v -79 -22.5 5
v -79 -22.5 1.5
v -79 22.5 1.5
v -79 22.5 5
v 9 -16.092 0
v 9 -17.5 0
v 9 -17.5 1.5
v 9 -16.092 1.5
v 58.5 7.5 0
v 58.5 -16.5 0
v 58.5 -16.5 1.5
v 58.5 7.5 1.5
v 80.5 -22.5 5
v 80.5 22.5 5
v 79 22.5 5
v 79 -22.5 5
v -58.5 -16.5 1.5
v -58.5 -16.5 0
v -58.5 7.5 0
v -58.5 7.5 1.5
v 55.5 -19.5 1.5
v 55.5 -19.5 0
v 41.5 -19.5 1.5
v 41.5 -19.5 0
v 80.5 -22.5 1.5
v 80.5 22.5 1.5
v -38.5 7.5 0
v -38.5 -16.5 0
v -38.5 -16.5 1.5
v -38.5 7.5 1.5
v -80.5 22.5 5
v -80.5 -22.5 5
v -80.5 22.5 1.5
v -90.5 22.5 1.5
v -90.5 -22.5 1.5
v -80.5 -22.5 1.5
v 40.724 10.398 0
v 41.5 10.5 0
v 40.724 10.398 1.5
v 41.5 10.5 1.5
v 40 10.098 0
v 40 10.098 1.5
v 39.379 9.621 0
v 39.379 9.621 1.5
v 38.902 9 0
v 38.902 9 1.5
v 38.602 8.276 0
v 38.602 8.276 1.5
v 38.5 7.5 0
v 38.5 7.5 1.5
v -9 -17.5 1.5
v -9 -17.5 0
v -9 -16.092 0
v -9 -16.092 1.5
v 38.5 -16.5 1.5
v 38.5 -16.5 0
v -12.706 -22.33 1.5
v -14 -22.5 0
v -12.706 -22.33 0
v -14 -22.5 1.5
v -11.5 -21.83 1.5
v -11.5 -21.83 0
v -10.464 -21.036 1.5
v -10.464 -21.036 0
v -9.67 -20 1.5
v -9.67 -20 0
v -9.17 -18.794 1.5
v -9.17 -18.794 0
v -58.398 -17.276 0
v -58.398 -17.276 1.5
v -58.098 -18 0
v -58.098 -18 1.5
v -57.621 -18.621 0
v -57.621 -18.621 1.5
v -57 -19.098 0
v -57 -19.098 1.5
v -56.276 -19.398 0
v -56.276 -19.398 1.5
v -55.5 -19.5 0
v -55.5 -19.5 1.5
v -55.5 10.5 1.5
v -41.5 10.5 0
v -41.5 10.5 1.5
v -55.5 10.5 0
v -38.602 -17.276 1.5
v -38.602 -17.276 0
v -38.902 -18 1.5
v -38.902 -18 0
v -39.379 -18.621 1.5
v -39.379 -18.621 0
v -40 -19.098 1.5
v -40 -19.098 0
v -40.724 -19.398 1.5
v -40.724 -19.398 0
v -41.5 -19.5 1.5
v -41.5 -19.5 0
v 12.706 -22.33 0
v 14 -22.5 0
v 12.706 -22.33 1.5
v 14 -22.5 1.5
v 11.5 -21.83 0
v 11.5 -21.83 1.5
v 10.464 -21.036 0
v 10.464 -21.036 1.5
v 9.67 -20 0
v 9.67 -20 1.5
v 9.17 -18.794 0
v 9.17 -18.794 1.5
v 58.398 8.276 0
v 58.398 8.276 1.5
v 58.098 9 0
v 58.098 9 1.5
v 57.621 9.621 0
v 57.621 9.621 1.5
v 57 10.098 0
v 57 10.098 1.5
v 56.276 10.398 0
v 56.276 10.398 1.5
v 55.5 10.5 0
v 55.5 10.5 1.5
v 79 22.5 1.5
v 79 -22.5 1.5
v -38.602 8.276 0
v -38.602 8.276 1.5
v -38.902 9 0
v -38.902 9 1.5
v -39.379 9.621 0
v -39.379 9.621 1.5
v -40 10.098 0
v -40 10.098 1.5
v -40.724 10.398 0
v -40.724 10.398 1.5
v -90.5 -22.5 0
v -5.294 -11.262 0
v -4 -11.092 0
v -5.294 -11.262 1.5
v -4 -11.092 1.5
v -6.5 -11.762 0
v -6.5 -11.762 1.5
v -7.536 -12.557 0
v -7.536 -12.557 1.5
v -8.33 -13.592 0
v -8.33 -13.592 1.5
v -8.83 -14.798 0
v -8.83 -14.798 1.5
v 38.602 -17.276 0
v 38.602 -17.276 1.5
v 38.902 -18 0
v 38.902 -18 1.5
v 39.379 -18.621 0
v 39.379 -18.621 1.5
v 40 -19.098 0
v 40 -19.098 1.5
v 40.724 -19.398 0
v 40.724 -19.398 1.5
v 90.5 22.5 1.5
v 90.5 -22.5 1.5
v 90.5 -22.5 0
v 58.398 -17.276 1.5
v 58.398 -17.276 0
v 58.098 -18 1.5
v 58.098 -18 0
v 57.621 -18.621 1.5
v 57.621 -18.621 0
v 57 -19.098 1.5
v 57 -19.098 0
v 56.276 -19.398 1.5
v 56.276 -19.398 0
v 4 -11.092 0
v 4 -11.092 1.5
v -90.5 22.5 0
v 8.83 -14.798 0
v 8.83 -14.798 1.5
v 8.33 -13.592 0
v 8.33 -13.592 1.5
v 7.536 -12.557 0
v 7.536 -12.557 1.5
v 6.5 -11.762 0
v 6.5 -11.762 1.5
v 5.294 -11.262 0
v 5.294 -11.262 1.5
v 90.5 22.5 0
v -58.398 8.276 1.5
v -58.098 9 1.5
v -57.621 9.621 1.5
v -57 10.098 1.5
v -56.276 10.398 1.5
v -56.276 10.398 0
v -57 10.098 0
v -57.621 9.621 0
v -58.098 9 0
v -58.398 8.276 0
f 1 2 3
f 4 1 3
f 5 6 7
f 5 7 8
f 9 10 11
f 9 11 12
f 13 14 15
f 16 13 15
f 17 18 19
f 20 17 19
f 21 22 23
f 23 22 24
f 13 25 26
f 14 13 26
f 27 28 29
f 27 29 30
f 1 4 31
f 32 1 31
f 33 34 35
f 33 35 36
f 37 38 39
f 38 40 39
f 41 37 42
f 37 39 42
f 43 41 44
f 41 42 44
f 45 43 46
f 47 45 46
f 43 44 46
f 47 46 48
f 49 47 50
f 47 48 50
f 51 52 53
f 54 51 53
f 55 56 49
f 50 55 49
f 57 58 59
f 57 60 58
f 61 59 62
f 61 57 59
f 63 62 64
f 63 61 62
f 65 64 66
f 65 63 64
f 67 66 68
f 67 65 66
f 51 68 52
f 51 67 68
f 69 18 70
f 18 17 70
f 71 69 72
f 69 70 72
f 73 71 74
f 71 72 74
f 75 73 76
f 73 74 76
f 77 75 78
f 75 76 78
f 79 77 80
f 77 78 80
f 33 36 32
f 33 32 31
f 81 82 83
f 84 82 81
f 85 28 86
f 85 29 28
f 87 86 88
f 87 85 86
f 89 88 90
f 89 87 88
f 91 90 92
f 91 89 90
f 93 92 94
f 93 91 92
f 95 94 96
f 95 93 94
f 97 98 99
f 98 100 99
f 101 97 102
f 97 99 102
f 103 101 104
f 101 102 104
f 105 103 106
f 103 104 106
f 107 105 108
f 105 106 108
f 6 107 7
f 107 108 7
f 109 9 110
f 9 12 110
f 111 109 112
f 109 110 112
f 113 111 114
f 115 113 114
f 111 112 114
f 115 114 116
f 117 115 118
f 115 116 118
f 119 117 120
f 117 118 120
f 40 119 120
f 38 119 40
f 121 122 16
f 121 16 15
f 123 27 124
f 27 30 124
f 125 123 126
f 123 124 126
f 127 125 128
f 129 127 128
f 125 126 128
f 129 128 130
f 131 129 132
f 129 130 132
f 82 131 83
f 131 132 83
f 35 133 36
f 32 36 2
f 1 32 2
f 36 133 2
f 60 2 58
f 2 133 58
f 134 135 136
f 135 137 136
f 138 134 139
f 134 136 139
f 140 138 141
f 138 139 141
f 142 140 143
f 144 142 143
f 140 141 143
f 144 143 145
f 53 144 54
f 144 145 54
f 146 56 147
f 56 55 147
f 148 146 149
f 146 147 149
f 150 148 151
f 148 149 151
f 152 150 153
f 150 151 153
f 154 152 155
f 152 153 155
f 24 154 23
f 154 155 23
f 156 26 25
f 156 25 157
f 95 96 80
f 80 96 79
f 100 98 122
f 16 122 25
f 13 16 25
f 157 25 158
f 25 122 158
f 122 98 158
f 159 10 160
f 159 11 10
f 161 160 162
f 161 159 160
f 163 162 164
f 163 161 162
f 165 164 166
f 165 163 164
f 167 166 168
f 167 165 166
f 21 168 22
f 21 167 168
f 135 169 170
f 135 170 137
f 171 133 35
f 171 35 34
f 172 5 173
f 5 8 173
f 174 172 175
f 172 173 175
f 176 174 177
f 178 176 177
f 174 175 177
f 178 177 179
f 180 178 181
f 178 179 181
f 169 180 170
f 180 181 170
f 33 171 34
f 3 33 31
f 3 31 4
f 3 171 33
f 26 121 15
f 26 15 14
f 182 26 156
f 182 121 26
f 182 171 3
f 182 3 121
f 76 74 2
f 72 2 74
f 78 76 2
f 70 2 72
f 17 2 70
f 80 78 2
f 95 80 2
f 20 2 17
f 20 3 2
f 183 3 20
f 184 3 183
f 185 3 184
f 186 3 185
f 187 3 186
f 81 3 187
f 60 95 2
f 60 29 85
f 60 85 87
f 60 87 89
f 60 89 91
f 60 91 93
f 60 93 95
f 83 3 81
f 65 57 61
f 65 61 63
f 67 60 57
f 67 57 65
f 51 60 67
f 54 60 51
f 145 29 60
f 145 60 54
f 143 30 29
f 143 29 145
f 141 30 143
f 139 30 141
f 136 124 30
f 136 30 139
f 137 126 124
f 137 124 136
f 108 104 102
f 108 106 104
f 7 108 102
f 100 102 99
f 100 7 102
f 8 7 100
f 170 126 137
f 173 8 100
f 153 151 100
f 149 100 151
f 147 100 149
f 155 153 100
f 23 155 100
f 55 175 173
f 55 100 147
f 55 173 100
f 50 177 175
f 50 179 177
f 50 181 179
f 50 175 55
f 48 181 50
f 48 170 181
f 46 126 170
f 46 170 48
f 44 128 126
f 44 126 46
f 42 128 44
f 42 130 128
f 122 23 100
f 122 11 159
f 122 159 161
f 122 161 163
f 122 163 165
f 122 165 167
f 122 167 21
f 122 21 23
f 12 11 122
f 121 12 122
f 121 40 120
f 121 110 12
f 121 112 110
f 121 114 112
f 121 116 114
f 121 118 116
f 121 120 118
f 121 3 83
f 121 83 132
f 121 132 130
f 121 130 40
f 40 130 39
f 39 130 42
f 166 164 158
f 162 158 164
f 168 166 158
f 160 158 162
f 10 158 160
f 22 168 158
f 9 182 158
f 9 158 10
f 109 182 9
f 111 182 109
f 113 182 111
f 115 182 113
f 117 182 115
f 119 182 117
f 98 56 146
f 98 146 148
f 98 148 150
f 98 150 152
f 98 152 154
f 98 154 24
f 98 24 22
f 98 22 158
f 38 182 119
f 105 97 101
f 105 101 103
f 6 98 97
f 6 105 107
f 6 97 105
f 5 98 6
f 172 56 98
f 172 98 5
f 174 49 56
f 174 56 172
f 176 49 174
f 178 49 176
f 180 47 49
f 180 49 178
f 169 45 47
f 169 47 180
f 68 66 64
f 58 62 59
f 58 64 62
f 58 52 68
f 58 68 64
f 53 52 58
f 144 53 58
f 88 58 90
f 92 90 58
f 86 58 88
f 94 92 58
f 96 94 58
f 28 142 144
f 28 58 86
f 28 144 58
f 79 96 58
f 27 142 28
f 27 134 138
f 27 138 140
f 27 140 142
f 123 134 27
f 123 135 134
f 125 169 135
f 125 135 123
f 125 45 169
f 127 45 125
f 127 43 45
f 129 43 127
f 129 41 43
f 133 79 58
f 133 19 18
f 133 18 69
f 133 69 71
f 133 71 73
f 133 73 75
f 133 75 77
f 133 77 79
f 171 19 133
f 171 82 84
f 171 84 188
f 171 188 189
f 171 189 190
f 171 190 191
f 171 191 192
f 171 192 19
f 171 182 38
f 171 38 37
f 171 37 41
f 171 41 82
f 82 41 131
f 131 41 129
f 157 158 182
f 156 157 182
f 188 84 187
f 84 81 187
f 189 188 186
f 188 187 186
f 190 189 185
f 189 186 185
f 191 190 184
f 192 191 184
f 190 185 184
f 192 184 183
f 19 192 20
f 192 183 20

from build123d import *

# Parameters (mm, degrees)
SKETCH_1_W          = 181
SKETCH_1_H          = 45
EXTRUDE_1_DEPTH     = 1.5
SKETCH_2_W          = 18
SKETCH_2_H          = 15
SKETCH_2_W_2        = 20
SKETCH_2_H_2        = 30
CUT_EXTRUDE_2_DEPTH = 94.267089587
FILLET_1_R          = 5
FILLET_2_R          = 5
FILLET_3_R          = 3
SKETCH_3_W          = 1.5
SKETCH_3_H          = 45
EXTRUDE_2_DEPTH     = 5


with BuildPart() as part:
    # 草图1 → 凸台-拉伸1 (new body)
    with BuildSketch(Plane.XY):
        Rectangle(SKETCH_1_W, SKETCH_1_H)
    extrude(amount=EXTRUDE_1_DEPTH)

    # 草图2 → 切除-拉伸2 (cut, through all)
    with BuildSketch(Plane(origin=(0, 0, 0), x_dir=(-1, 0, 0), z_dir=(0, 0, -1))):
        with Locations((0, -18.592127564)):
            Rectangle(SKETCH_2_W, SKETCH_2_H)
        with Locations((48.5, -4.5)):
            Rectangle(SKETCH_2_W_2, SKETCH_2_H_2)
        with Locations((-48.5, -4.5)):
            Rectangle(SKETCH_2_W_2, SKETCH_2_H_2)
    extrude(amount=-CUT_EXTRUDE_2_DEPTH, mode=Mode.SUBTRACT)

    # 圆角1
    fillet_1_edges = [part.edges().sort_by_distance(p)[0] for p in [
        (-9, -22.5, 0.75),
        (9, -22.5, 0.75),
    ]]
    fillet(fillet_1_edges, radius=FILLET_1_R)

    # 圆角2
    fillet_2_edges = [part.edges().sort_by_distance(p)[0] for p in [
        (-9, -11.092127564, 0.75),
        (9, -11.092127564, 0.75),
    ]]
    fillet(fillet_2_edges, radius=FILLET_2_R)

    # 圆角3
    fillet_3_edges = [part.edges().sort_by_distance(p)[0] for p in [
        (38.5, -19.5, 0.75),
        (58.5, -19.5, 0.75),
        (58.5, 10.5, 0.75),
        (38.5, 10.5, 0.75),
        (-38.5, -19.5, 0.75),
        (-38.5, 10.5, 0.75),
        (-58.5, 10.5, 0.75),
        (-58.5, -19.5, 0.75),
    ]]
    fillet(fillet_3_edges, radius=FILLET_3_R)

    # 草图3 → 凸台-拉伸2 (add)
    with BuildSketch(Plane(origin=(0, 0, 0), x_dir=(-1, 0, 0), z_dir=(0, 0, -1))):
        with Locations((79.75, 0)):
            Rectangle(SKETCH_3_W, SKETCH_3_H)
        with Locations((-79.75, 0)):
            Rectangle(SKETCH_3_W, SKETCH_3_H)
    extrude(amount=-EXTRUDE_2_DEPTH)


solid = part.part
